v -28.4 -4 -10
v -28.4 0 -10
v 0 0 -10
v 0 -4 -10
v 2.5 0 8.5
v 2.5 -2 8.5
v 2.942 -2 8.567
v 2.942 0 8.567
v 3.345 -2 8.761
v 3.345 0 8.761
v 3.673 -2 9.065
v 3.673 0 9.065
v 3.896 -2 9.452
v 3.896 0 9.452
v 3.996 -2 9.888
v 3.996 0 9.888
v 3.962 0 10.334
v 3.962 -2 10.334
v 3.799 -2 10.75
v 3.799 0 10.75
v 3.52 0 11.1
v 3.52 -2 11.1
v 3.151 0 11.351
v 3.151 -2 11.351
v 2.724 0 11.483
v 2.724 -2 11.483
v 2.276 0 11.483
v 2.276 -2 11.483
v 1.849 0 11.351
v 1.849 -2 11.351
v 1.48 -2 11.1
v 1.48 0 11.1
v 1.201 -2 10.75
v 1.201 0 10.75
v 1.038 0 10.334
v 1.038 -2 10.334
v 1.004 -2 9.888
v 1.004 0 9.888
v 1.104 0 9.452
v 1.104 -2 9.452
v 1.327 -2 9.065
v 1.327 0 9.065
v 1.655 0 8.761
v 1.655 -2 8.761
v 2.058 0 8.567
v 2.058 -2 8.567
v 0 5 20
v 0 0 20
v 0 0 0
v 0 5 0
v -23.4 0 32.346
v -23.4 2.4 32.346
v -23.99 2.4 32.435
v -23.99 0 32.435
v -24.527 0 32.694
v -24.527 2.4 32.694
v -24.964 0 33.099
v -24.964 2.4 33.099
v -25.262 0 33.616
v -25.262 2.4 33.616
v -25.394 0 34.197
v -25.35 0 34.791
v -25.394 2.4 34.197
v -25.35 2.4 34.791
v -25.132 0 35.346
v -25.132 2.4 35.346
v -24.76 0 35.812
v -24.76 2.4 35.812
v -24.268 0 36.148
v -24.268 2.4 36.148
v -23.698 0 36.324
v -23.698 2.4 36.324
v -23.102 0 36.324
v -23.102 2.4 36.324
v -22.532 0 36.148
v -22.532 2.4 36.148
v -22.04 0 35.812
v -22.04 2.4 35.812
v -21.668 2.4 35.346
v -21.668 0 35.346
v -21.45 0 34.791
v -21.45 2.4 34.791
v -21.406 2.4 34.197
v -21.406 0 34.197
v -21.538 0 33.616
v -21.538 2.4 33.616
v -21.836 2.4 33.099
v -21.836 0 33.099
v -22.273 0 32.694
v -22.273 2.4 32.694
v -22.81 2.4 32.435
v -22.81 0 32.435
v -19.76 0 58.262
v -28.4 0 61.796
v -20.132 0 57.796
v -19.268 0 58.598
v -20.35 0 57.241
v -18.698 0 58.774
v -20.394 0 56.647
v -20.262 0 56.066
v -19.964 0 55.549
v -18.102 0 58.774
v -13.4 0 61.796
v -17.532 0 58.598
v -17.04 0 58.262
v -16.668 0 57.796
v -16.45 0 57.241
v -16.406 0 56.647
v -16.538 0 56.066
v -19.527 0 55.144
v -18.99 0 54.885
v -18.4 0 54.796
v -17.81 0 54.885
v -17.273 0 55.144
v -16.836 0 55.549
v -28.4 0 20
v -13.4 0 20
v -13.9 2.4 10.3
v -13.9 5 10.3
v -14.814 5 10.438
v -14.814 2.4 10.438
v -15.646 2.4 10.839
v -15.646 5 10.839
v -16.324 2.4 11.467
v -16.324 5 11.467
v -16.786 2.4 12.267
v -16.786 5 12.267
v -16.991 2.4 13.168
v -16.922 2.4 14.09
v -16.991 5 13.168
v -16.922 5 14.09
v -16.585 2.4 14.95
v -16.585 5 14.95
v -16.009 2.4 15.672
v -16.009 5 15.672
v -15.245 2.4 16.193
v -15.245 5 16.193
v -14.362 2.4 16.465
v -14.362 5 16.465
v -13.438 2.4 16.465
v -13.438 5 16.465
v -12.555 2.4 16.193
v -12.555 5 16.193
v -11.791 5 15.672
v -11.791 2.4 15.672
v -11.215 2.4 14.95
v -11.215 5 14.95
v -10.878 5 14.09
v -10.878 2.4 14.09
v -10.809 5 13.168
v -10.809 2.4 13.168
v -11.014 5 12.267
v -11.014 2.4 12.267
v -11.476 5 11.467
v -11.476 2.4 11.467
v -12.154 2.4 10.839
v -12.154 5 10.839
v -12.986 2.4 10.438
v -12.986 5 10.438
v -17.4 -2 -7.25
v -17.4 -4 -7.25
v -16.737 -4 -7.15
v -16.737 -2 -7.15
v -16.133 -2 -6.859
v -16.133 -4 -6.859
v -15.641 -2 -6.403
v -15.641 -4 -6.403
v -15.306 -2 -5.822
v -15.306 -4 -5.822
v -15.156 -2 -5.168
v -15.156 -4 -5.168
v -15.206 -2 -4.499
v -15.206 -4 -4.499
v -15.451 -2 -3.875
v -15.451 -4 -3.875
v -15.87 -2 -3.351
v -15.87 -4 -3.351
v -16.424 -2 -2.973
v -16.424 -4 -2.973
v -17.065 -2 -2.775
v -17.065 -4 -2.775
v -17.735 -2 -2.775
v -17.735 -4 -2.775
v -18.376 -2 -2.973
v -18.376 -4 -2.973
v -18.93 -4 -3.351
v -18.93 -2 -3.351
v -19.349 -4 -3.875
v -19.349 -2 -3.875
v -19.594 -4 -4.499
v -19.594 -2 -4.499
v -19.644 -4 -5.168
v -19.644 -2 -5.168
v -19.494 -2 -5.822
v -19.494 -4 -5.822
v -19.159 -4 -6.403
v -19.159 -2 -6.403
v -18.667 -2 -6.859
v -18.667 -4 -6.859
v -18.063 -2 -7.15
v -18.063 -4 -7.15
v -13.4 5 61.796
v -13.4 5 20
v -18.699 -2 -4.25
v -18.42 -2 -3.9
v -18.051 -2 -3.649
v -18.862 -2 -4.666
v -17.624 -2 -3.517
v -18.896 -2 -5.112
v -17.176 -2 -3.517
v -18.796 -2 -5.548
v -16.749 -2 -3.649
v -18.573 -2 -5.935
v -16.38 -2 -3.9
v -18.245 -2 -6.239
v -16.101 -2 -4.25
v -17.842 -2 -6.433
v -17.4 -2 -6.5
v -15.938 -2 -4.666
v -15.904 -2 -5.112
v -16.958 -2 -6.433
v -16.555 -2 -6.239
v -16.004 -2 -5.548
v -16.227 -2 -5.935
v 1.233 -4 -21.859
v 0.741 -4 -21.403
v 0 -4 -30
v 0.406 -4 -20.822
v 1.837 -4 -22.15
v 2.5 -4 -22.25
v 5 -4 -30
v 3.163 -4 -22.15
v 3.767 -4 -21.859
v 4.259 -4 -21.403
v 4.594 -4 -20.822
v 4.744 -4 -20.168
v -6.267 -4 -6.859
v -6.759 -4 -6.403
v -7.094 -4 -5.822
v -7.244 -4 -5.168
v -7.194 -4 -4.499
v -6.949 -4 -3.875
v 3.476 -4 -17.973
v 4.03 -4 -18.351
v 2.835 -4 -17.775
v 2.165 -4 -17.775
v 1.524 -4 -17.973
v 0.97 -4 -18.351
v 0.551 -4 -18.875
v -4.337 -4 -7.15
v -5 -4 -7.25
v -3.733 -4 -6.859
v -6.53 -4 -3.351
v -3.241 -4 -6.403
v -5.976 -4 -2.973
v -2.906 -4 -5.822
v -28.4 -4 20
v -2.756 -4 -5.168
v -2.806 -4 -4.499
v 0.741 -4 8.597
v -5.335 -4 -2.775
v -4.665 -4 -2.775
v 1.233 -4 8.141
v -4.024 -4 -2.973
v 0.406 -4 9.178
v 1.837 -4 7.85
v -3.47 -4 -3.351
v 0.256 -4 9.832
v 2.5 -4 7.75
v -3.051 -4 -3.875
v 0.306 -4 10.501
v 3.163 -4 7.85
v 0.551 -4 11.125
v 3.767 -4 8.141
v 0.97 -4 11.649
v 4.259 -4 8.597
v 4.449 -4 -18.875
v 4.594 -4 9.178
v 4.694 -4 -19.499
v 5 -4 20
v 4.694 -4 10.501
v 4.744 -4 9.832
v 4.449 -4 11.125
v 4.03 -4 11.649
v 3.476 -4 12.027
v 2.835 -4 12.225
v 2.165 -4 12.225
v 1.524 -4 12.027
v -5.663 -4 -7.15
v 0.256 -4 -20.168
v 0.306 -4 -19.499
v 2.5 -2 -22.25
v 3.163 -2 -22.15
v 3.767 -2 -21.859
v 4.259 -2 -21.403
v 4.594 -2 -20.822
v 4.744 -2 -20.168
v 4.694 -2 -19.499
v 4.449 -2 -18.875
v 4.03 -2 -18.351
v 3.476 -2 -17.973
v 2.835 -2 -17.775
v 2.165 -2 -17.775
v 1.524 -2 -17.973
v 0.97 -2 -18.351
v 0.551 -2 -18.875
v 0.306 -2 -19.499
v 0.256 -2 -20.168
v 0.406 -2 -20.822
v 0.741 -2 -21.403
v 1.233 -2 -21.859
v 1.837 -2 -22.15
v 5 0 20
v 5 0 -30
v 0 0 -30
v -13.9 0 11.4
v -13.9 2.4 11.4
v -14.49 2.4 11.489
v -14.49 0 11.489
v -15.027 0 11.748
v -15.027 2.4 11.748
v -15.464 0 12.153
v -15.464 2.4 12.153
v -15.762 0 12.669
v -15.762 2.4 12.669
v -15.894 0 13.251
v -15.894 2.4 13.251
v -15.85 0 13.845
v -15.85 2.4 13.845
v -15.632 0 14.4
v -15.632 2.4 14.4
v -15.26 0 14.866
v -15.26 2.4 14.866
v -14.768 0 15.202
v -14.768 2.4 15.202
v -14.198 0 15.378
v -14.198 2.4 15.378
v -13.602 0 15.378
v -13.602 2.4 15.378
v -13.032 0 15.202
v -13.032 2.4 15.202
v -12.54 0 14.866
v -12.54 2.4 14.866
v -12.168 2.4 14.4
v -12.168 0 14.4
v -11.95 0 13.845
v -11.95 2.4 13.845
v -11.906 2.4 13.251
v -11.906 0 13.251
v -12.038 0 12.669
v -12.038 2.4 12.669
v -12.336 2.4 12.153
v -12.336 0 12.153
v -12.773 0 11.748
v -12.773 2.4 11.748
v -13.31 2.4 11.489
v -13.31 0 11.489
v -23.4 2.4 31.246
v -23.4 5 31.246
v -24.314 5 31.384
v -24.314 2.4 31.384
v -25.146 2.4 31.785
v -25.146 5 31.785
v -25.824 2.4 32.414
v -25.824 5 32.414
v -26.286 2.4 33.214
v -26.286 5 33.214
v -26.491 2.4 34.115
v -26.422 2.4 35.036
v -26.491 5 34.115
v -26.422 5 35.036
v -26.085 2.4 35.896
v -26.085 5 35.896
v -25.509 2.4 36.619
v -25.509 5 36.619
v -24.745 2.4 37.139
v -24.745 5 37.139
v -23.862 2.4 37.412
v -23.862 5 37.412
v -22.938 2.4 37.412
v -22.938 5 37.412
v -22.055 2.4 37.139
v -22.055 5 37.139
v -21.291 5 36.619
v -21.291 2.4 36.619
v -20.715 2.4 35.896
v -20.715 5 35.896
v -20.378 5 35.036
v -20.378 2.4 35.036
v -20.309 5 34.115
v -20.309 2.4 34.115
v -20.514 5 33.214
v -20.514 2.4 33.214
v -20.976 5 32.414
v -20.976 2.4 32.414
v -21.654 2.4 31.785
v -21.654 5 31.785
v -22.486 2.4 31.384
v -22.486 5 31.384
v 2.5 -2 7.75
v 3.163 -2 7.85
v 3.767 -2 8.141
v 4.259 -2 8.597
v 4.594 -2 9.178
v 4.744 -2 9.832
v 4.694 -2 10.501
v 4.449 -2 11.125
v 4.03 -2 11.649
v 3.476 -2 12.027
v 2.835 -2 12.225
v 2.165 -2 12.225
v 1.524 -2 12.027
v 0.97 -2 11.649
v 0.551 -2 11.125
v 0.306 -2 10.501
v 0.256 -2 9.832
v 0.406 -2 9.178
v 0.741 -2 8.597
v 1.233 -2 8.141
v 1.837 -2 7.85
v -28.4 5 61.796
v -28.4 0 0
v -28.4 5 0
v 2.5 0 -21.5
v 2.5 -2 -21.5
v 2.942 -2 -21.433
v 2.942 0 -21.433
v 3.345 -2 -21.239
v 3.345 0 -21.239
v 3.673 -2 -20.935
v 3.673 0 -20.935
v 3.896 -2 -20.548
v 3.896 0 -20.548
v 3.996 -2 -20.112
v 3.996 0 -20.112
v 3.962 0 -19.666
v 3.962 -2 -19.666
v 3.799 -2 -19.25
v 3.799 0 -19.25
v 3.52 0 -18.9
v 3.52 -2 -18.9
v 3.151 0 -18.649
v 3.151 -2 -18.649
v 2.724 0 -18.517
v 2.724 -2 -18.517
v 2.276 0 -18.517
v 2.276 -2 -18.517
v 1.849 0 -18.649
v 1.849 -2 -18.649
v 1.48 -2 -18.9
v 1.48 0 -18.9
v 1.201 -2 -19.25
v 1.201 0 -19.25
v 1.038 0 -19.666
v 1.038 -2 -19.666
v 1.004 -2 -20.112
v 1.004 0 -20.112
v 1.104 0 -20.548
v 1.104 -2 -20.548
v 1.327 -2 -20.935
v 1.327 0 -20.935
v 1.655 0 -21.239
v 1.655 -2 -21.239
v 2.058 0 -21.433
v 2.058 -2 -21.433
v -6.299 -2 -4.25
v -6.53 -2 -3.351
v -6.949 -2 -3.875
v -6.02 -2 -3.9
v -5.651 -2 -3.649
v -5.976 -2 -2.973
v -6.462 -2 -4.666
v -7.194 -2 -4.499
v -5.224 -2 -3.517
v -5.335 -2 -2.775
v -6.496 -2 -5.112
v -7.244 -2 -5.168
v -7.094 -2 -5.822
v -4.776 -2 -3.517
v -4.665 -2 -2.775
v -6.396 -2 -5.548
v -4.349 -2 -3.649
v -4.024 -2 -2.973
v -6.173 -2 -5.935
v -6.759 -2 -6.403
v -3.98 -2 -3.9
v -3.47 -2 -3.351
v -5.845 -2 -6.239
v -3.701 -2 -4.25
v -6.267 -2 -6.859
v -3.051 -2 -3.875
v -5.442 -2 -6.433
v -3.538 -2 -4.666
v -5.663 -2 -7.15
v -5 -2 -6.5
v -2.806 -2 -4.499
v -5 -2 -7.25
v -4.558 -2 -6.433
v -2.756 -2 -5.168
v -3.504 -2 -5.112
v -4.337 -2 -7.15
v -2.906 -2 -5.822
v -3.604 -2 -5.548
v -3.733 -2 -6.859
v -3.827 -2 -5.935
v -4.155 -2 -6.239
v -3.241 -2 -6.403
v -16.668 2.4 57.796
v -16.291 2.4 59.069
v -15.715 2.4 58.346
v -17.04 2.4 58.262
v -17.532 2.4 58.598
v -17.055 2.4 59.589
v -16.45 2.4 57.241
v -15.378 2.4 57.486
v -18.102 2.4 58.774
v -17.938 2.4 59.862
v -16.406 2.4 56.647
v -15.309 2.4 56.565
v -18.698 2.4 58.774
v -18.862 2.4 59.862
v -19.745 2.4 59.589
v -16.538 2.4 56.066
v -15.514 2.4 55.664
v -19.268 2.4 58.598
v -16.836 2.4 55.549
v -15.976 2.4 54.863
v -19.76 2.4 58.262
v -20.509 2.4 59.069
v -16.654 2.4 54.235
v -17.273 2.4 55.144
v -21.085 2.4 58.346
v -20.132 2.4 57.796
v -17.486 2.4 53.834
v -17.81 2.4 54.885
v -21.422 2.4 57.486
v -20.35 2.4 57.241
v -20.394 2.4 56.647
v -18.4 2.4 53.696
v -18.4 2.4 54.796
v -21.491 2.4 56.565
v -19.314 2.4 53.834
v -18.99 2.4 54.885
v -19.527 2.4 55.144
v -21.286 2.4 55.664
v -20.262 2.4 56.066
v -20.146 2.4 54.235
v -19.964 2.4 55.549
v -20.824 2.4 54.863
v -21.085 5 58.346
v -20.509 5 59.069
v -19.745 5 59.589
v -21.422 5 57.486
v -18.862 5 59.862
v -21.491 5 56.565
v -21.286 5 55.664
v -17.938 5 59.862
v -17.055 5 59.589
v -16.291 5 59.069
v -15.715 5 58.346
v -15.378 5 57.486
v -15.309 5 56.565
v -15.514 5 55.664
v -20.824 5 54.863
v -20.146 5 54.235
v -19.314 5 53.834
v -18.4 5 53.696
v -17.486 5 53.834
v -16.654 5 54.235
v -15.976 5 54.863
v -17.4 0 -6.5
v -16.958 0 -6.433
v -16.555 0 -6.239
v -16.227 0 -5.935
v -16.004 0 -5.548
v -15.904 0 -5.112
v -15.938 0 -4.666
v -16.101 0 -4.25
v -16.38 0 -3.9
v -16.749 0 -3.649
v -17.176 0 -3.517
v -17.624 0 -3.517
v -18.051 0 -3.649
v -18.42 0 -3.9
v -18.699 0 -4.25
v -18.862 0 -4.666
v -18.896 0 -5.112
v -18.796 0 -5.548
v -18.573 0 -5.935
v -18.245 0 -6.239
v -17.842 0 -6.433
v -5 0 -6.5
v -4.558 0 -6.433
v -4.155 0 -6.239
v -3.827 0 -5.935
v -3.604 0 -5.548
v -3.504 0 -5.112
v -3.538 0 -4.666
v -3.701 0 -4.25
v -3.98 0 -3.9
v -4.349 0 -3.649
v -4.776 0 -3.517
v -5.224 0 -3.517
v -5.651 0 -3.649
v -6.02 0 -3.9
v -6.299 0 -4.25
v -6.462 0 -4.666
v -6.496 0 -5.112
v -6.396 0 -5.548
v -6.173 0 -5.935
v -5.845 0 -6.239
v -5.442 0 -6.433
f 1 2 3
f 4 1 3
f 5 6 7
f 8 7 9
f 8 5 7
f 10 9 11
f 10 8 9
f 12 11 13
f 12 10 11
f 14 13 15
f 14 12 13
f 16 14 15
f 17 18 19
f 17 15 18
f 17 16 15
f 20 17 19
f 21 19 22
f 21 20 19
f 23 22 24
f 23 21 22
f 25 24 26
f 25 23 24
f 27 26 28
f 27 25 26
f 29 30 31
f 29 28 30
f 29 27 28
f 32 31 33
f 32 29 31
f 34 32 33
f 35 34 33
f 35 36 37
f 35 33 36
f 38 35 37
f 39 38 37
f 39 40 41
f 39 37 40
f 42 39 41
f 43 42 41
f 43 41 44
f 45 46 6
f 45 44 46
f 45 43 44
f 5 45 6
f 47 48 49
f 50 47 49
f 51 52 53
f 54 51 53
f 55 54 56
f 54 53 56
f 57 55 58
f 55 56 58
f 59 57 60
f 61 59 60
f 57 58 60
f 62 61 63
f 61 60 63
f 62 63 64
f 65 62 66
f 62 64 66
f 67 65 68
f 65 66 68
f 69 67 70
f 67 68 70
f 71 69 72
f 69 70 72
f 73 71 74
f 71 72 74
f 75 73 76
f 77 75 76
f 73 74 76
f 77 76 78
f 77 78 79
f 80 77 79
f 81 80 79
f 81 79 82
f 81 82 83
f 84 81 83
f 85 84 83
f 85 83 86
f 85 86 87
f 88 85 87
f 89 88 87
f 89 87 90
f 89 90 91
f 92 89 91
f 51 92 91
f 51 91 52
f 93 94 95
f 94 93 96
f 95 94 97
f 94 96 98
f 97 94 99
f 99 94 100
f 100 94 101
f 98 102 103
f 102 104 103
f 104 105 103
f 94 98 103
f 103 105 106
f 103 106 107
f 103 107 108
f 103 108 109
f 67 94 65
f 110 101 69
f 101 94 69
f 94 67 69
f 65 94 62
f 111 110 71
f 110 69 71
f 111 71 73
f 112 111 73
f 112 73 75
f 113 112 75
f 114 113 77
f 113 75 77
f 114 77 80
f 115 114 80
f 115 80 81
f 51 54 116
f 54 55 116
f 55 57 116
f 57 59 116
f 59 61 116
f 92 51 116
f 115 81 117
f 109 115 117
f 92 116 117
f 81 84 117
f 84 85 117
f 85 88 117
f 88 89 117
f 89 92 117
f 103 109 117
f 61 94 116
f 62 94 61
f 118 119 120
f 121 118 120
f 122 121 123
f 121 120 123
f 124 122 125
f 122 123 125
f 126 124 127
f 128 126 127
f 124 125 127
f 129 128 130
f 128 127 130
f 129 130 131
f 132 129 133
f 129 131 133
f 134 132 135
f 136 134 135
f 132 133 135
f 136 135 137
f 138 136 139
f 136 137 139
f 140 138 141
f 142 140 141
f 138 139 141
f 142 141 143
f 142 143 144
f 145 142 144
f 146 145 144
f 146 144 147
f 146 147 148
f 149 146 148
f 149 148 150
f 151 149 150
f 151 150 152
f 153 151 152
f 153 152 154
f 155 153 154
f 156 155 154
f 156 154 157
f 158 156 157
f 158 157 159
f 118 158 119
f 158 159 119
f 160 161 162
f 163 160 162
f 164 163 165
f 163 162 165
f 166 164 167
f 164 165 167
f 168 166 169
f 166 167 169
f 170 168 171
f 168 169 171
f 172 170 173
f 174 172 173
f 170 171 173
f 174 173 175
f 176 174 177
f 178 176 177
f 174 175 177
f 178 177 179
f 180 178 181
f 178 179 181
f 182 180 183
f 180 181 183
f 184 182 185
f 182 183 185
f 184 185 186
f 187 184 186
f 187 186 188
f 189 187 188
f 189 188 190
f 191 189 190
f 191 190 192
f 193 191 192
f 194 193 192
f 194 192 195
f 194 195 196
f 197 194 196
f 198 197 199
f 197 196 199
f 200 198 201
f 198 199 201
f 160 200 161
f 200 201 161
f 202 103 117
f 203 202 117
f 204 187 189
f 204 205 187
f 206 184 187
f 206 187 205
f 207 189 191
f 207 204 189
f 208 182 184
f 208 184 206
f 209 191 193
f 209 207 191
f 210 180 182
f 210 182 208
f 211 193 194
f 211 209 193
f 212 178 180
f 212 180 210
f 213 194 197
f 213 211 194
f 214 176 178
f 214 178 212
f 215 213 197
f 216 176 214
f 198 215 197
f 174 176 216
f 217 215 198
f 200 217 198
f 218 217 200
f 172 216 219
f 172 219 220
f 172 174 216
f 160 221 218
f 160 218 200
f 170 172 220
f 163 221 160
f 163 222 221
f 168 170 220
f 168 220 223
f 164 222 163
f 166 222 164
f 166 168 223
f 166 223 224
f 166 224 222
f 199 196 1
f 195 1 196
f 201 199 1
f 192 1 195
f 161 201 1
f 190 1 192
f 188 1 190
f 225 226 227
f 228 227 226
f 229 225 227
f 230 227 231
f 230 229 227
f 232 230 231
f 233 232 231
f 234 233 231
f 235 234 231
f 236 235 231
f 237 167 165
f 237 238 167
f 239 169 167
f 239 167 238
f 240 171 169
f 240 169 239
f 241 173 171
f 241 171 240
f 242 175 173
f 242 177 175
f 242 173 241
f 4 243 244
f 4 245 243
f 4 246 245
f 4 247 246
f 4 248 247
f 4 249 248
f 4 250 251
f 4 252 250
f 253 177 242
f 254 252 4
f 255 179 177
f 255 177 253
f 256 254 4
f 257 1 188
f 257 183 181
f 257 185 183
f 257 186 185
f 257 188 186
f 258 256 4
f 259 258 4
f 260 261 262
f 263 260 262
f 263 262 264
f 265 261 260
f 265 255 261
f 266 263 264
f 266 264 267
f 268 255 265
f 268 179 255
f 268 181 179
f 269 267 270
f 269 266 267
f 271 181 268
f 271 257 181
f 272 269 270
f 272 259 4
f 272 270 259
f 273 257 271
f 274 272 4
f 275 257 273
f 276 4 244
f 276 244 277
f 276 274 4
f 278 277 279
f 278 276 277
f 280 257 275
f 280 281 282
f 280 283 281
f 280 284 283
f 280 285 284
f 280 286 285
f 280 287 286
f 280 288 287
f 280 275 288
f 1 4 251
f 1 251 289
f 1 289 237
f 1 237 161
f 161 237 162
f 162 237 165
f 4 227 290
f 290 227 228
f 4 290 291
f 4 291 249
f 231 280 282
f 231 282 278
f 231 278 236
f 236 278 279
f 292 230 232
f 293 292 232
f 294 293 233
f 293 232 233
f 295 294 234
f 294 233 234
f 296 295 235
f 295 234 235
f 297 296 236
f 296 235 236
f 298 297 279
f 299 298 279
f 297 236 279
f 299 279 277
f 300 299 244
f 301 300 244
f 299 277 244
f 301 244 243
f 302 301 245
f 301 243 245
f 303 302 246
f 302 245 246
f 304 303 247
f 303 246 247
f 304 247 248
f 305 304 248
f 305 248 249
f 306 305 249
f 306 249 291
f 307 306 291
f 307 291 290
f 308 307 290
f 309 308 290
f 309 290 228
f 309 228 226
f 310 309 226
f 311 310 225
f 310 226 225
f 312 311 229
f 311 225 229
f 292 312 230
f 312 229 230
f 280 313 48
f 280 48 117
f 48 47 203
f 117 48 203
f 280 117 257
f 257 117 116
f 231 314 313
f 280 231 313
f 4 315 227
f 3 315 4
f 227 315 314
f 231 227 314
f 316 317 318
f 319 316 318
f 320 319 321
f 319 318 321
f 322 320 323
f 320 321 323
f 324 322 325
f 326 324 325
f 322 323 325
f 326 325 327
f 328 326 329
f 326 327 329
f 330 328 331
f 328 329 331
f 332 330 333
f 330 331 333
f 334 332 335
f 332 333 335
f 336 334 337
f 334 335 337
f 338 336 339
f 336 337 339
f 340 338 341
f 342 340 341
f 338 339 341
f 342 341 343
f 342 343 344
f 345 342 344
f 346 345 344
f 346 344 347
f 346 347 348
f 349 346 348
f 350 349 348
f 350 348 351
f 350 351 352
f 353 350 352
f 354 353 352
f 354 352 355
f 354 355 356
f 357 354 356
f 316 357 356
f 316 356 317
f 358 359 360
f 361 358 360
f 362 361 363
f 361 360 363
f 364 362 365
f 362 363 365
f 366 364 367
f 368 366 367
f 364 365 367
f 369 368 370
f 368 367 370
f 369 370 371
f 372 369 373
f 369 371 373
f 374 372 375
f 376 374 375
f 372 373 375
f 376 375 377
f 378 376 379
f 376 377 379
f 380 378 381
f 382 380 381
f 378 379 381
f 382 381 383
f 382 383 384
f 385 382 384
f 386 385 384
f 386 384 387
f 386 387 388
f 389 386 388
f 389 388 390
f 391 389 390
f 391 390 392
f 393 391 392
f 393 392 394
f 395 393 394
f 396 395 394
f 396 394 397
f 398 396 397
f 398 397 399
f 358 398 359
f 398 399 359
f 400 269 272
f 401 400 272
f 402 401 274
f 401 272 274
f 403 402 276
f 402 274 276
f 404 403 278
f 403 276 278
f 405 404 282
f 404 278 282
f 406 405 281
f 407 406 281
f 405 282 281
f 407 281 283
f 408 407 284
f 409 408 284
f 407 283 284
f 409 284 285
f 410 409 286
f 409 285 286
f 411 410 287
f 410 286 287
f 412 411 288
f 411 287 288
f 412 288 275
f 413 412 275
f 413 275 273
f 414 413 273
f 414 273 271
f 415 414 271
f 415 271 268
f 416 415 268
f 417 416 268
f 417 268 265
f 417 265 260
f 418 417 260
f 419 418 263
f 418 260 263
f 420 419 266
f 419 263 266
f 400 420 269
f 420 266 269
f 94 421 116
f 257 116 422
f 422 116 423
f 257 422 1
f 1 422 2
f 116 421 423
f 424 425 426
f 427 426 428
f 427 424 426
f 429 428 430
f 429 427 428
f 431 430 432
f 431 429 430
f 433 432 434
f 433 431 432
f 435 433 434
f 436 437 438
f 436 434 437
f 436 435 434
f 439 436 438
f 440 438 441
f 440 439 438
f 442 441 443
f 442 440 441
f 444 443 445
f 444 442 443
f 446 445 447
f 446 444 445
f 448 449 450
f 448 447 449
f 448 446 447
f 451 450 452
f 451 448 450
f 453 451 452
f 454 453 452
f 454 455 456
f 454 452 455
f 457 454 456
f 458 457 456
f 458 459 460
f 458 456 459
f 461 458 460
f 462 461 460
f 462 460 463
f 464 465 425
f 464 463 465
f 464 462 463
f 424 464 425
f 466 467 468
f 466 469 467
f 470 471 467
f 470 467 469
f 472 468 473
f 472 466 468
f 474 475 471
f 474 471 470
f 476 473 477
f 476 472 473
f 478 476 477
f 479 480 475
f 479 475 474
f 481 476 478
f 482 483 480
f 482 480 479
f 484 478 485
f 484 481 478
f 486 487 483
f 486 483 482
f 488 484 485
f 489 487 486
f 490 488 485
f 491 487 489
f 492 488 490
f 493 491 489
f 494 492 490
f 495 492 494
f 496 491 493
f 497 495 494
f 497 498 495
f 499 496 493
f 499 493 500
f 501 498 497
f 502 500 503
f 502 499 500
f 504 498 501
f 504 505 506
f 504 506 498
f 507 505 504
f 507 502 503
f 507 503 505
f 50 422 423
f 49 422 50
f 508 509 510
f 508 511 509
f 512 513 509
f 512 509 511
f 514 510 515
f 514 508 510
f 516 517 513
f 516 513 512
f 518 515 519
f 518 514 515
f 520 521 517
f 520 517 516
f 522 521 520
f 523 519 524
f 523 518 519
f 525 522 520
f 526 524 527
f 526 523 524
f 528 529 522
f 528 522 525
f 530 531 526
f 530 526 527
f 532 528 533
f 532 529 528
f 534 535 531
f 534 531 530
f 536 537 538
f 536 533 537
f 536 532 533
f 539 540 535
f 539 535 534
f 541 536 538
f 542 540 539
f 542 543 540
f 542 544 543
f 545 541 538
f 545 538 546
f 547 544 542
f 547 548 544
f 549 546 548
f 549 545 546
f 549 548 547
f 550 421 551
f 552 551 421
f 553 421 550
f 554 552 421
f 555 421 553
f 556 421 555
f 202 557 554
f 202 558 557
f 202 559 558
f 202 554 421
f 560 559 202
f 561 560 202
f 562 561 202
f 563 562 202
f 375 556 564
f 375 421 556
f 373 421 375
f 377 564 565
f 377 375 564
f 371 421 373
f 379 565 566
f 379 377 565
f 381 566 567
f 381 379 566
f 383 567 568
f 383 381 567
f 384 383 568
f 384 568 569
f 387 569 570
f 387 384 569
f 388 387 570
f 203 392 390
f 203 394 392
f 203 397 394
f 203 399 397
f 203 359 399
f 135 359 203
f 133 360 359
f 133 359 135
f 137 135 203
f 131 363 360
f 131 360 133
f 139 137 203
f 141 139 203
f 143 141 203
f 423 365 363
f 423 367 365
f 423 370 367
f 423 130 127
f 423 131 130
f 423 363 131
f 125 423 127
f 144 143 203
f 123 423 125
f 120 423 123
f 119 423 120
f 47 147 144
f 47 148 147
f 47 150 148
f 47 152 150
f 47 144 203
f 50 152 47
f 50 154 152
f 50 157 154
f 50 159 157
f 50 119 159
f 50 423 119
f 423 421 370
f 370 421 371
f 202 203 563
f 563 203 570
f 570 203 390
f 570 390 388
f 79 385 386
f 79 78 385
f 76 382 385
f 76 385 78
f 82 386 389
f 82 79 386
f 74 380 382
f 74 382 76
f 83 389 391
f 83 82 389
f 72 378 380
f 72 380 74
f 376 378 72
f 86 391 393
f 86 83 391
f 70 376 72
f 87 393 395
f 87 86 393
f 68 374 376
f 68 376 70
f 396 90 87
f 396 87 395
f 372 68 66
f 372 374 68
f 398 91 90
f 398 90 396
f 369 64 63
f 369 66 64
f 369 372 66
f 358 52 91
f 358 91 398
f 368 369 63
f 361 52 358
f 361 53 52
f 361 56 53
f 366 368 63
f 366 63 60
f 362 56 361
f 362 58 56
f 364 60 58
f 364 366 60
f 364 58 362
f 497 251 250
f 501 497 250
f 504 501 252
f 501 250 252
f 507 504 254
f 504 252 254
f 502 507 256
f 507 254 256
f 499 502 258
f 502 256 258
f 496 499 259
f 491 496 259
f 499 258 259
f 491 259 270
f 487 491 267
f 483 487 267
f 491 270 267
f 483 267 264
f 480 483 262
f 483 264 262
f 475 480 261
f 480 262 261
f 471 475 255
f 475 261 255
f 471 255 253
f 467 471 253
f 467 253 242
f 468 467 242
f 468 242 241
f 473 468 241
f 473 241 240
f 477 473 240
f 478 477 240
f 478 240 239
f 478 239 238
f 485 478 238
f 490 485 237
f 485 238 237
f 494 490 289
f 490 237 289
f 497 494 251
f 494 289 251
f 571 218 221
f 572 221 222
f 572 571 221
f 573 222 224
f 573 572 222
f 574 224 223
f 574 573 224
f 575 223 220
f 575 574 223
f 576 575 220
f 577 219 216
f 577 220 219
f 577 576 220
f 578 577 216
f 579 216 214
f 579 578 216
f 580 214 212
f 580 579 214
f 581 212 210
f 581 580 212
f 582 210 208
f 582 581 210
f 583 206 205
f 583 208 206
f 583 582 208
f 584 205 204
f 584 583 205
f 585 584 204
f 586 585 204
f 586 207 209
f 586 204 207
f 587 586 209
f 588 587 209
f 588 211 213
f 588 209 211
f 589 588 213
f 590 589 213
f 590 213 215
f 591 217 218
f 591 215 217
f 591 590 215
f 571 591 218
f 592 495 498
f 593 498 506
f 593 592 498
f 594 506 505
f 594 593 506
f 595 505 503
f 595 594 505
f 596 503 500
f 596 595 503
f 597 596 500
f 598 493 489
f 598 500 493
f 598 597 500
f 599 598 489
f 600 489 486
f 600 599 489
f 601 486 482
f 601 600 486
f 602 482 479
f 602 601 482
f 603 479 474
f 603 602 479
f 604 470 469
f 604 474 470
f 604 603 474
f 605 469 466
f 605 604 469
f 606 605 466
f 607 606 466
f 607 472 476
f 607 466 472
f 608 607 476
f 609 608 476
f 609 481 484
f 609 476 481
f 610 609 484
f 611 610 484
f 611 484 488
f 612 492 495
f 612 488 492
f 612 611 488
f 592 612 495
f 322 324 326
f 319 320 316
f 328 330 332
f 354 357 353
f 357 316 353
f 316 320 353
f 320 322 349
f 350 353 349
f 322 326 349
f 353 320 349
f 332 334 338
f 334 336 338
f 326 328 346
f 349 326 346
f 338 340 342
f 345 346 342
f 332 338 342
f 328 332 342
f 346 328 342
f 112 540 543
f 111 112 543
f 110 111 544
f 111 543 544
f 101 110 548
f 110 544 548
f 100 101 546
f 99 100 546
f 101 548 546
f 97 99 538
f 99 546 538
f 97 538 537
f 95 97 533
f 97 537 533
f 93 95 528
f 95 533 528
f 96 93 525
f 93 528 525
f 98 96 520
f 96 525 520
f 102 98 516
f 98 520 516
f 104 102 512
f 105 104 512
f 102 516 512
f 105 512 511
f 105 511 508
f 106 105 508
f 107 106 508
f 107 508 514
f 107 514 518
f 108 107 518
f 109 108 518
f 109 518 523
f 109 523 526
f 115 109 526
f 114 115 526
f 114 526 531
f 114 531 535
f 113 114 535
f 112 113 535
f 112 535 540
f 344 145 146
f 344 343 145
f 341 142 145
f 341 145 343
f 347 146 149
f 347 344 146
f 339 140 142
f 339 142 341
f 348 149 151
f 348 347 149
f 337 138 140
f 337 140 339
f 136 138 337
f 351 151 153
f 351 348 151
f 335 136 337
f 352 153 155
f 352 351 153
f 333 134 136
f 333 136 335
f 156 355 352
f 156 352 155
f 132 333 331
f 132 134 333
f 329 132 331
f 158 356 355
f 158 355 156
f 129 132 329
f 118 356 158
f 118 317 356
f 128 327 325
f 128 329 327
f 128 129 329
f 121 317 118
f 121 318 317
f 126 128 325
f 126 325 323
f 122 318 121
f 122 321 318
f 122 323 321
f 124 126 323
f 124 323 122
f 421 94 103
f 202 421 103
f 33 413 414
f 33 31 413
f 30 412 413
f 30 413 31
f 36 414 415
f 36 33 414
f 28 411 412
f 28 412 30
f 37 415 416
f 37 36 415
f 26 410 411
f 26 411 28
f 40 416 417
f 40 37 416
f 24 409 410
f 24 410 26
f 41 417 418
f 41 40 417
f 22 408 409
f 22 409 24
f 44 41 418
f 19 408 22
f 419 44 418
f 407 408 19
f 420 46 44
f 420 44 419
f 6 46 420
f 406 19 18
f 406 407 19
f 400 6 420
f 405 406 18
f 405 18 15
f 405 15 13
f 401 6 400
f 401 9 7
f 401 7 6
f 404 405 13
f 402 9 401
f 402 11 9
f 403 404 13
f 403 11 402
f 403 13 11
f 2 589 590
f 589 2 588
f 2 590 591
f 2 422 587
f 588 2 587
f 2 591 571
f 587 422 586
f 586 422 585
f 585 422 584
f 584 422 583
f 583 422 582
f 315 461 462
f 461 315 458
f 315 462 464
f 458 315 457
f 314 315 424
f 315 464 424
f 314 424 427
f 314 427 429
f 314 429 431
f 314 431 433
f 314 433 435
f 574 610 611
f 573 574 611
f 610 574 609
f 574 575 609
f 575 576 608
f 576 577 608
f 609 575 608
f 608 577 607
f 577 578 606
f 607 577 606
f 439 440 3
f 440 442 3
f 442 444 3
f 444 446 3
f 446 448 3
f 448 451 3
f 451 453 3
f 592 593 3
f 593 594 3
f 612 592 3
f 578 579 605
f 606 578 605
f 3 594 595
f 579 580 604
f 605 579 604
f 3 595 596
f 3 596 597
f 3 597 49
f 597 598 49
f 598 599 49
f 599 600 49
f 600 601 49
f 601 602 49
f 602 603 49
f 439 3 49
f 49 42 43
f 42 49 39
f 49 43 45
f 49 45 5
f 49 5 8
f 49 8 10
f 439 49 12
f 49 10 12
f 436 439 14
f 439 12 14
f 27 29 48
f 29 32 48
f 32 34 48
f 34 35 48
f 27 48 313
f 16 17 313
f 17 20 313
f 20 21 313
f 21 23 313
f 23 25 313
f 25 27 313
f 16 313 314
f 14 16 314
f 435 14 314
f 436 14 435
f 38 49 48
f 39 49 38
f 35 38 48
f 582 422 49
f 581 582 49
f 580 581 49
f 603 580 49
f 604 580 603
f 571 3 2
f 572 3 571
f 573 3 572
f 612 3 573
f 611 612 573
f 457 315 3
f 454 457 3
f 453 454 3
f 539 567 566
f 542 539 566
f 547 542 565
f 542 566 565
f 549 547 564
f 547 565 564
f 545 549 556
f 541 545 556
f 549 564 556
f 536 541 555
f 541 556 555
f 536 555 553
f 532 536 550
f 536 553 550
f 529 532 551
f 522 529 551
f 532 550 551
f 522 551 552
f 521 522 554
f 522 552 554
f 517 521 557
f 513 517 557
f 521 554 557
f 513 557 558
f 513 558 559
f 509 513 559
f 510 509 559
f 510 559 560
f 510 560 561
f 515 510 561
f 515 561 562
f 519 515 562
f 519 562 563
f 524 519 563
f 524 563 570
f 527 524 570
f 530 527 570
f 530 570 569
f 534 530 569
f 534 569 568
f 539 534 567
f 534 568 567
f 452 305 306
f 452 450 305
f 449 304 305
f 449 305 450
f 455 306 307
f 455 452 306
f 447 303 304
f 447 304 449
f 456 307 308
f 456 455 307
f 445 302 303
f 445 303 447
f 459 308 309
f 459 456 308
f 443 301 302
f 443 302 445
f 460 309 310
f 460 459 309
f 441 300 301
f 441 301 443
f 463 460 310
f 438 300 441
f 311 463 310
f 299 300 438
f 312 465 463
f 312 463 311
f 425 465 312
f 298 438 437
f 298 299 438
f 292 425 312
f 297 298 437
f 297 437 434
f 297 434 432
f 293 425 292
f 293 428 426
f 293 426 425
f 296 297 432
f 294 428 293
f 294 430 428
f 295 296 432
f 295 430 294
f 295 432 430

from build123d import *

# Parameters (mm, degrees)
SKETCH_4_W          = 28.4
SKETCH_4_H          = 61.796304386
EXTRUDE_1_DEPTH     = 5
CUT_EXTRUDE_START   = 5
SKETCH_4_4_R        = 3.1
CUT_EXTRUDE_1_DEPTH = 2.6
SKETCH_4_5_R        = 2
CUT_EXTRUDE_2_DEPTH = 74.193425166
SKETCH_4_6_W        = 13.4
SKETCH_4_6_H        = 41.796304386
CUT_EXTRUDE_3_DEPTH = 69.193425166
SKETCH_5_W          = 5
SKETCH_5_H          = 20
EXTRUDE_2_DEPTH     = 4
SKETCH_5_3_R        = 1.5
CUT_EXTRUDE_5_DEPTH = 69.193425166
CUT_EXTRUDE_START_2 = 4
SKETCH_5_4_R        = 2.25
CUT_EXTRUDE_7_DEPTH = 2


with BuildPart() as part:
    # 草图4 → 凸台-拉伸1 (new body)
    with BuildSketch(Plane(origin=(0, 0, 0), x_dir=(1, 0, 0), z_dir=(0, 1, 0))):
        with Locations((-14.2, -30.898152193)):
            Rectangle(SKETCH_4_W, SKETCH_4_H)
    extrude(amount=EXTRUDE_1_DEPTH)

    # 草图4<4> → 切除-拉伸1 (cut)
    with BuildSketch(Plane(origin=(0, 0, 0), x_dir=(1, 0, 0), z_dir=(0, 1, 0)).offset(CUT_EXTRUDE_START)):
        with Locations(Location((-13.9, -13.4, 0), (0, 0, 90))):
            Circle(SKETCH_4_4_R)
        with Locations(Location((-23.4, -34.346360066, 0), (0, 0, 90))):
            Circle(SKETCH_4_4_R)
        with Locations(Location((-18.4, -56.796304386, 0), (0, 0, 90))):
            Circle(SKETCH_4_4_R)
    extrude(amount=-CUT_EXTRUDE_1_DEPTH, mode=Mode.SUBTRACT)

    # 草图4<5> → 切除-拉伸2 (cut, through all)
    with BuildSketch(Plane(origin=(0, 0, 0), x_dir=(1, 0, 0), z_dir=(0, 1, 0)).offset(CUT_EXTRUDE_START)):
        with Locations(Location((-13.9, -13.4, 0), (0, 0, 90))):
            Circle(SKETCH_4_5_R)
        with Locations(Location((-23.4, -34.346360066, 0), (0, 0, 90))):
            Circle(SKETCH_4_5_R)
        with Locations(Location((-18.4, -56.796304386, 0), (0, 0, 90))):
            Circle(SKETCH_4_5_R)
    extrude(amount=-CUT_EXTRUDE_2_DEPTH, mode=Mode.SUBTRACT)

    # 草图4<6> → 切除-拉伸3 (cut, through all)
    with BuildSketch(Plane(origin=(0, 0, 0), x_dir=(1, 0, 0), z_dir=(0, 1, 0))):
        with Locations((-6.7, -40.898152193)):
            Rectangle(SKETCH_4_6_W, SKETCH_4_6_H)
    extrude(amount=CUT_EXTRUDE_3_DEPTH, mode=Mode.SUBTRACT)

    # 草图5 → 凸台-拉伸2 (add)
    with BuildSketch(Plane.XZ):
        Polygon((5, -10), (5, 20), (-28.4, 20), (-28.4, -10), (0, -10), align=None)
        with Locations((2.5, -20)):
            Rectangle(SKETCH_5_W, SKETCH_5_H)
    extrude(amount=EXTRUDE_2_DEPTH)

    # 草图5<3> → 切除-拉伸5 (cut, through all)
    with BuildSketch(Plane.XZ):
        with Locations(Location((-17.4, -5, 0), (0, 0, 270))):
            Circle(SKETCH_5_3_R)
        with Locations(Location((-5, -5, 0), (0, 0, 270))):
            Circle(SKETCH_5_3_R)
        with Locations(Location((2.5, 10, 0), (0, 0, 270))):
            Circle(SKETCH_5_3_R)
        with Locations(Location((2.5, -20, 0), (0, 0, 270))):
            Circle(SKETCH_5_3_R)
    extrude(amount=CUT_EXTRUDE_5_DEPTH, mode=Mode.SUBTRACT)

    # 草图5<4> → 切除-拉伸7 (cut)
    with BuildSketch(Plane.XZ.offset(CUT_EXTRUDE_START_2)):
        with Locations(Location((-17.4, -5, 0), (0, 0, 270))):
            Circle(SKETCH_5_4_R)
        with Locations(Location((-5, -5, 0), (0, 0, 270))):
            Circle(SKETCH_5_4_R)
        with Locations(Location((2.5, 10, 0), (0, 0, 270))):
            Circle(SKETCH_5_4_R)
        with Locations(Location((2.5, -20, 0), (0, 0, 270))):
            Circle(SKETCH_5_4_R)
    extrude(amount=-CUT_EXTRUDE_7_DEPTH, mode=Mode.SUBTRACT)


solid = part.part
